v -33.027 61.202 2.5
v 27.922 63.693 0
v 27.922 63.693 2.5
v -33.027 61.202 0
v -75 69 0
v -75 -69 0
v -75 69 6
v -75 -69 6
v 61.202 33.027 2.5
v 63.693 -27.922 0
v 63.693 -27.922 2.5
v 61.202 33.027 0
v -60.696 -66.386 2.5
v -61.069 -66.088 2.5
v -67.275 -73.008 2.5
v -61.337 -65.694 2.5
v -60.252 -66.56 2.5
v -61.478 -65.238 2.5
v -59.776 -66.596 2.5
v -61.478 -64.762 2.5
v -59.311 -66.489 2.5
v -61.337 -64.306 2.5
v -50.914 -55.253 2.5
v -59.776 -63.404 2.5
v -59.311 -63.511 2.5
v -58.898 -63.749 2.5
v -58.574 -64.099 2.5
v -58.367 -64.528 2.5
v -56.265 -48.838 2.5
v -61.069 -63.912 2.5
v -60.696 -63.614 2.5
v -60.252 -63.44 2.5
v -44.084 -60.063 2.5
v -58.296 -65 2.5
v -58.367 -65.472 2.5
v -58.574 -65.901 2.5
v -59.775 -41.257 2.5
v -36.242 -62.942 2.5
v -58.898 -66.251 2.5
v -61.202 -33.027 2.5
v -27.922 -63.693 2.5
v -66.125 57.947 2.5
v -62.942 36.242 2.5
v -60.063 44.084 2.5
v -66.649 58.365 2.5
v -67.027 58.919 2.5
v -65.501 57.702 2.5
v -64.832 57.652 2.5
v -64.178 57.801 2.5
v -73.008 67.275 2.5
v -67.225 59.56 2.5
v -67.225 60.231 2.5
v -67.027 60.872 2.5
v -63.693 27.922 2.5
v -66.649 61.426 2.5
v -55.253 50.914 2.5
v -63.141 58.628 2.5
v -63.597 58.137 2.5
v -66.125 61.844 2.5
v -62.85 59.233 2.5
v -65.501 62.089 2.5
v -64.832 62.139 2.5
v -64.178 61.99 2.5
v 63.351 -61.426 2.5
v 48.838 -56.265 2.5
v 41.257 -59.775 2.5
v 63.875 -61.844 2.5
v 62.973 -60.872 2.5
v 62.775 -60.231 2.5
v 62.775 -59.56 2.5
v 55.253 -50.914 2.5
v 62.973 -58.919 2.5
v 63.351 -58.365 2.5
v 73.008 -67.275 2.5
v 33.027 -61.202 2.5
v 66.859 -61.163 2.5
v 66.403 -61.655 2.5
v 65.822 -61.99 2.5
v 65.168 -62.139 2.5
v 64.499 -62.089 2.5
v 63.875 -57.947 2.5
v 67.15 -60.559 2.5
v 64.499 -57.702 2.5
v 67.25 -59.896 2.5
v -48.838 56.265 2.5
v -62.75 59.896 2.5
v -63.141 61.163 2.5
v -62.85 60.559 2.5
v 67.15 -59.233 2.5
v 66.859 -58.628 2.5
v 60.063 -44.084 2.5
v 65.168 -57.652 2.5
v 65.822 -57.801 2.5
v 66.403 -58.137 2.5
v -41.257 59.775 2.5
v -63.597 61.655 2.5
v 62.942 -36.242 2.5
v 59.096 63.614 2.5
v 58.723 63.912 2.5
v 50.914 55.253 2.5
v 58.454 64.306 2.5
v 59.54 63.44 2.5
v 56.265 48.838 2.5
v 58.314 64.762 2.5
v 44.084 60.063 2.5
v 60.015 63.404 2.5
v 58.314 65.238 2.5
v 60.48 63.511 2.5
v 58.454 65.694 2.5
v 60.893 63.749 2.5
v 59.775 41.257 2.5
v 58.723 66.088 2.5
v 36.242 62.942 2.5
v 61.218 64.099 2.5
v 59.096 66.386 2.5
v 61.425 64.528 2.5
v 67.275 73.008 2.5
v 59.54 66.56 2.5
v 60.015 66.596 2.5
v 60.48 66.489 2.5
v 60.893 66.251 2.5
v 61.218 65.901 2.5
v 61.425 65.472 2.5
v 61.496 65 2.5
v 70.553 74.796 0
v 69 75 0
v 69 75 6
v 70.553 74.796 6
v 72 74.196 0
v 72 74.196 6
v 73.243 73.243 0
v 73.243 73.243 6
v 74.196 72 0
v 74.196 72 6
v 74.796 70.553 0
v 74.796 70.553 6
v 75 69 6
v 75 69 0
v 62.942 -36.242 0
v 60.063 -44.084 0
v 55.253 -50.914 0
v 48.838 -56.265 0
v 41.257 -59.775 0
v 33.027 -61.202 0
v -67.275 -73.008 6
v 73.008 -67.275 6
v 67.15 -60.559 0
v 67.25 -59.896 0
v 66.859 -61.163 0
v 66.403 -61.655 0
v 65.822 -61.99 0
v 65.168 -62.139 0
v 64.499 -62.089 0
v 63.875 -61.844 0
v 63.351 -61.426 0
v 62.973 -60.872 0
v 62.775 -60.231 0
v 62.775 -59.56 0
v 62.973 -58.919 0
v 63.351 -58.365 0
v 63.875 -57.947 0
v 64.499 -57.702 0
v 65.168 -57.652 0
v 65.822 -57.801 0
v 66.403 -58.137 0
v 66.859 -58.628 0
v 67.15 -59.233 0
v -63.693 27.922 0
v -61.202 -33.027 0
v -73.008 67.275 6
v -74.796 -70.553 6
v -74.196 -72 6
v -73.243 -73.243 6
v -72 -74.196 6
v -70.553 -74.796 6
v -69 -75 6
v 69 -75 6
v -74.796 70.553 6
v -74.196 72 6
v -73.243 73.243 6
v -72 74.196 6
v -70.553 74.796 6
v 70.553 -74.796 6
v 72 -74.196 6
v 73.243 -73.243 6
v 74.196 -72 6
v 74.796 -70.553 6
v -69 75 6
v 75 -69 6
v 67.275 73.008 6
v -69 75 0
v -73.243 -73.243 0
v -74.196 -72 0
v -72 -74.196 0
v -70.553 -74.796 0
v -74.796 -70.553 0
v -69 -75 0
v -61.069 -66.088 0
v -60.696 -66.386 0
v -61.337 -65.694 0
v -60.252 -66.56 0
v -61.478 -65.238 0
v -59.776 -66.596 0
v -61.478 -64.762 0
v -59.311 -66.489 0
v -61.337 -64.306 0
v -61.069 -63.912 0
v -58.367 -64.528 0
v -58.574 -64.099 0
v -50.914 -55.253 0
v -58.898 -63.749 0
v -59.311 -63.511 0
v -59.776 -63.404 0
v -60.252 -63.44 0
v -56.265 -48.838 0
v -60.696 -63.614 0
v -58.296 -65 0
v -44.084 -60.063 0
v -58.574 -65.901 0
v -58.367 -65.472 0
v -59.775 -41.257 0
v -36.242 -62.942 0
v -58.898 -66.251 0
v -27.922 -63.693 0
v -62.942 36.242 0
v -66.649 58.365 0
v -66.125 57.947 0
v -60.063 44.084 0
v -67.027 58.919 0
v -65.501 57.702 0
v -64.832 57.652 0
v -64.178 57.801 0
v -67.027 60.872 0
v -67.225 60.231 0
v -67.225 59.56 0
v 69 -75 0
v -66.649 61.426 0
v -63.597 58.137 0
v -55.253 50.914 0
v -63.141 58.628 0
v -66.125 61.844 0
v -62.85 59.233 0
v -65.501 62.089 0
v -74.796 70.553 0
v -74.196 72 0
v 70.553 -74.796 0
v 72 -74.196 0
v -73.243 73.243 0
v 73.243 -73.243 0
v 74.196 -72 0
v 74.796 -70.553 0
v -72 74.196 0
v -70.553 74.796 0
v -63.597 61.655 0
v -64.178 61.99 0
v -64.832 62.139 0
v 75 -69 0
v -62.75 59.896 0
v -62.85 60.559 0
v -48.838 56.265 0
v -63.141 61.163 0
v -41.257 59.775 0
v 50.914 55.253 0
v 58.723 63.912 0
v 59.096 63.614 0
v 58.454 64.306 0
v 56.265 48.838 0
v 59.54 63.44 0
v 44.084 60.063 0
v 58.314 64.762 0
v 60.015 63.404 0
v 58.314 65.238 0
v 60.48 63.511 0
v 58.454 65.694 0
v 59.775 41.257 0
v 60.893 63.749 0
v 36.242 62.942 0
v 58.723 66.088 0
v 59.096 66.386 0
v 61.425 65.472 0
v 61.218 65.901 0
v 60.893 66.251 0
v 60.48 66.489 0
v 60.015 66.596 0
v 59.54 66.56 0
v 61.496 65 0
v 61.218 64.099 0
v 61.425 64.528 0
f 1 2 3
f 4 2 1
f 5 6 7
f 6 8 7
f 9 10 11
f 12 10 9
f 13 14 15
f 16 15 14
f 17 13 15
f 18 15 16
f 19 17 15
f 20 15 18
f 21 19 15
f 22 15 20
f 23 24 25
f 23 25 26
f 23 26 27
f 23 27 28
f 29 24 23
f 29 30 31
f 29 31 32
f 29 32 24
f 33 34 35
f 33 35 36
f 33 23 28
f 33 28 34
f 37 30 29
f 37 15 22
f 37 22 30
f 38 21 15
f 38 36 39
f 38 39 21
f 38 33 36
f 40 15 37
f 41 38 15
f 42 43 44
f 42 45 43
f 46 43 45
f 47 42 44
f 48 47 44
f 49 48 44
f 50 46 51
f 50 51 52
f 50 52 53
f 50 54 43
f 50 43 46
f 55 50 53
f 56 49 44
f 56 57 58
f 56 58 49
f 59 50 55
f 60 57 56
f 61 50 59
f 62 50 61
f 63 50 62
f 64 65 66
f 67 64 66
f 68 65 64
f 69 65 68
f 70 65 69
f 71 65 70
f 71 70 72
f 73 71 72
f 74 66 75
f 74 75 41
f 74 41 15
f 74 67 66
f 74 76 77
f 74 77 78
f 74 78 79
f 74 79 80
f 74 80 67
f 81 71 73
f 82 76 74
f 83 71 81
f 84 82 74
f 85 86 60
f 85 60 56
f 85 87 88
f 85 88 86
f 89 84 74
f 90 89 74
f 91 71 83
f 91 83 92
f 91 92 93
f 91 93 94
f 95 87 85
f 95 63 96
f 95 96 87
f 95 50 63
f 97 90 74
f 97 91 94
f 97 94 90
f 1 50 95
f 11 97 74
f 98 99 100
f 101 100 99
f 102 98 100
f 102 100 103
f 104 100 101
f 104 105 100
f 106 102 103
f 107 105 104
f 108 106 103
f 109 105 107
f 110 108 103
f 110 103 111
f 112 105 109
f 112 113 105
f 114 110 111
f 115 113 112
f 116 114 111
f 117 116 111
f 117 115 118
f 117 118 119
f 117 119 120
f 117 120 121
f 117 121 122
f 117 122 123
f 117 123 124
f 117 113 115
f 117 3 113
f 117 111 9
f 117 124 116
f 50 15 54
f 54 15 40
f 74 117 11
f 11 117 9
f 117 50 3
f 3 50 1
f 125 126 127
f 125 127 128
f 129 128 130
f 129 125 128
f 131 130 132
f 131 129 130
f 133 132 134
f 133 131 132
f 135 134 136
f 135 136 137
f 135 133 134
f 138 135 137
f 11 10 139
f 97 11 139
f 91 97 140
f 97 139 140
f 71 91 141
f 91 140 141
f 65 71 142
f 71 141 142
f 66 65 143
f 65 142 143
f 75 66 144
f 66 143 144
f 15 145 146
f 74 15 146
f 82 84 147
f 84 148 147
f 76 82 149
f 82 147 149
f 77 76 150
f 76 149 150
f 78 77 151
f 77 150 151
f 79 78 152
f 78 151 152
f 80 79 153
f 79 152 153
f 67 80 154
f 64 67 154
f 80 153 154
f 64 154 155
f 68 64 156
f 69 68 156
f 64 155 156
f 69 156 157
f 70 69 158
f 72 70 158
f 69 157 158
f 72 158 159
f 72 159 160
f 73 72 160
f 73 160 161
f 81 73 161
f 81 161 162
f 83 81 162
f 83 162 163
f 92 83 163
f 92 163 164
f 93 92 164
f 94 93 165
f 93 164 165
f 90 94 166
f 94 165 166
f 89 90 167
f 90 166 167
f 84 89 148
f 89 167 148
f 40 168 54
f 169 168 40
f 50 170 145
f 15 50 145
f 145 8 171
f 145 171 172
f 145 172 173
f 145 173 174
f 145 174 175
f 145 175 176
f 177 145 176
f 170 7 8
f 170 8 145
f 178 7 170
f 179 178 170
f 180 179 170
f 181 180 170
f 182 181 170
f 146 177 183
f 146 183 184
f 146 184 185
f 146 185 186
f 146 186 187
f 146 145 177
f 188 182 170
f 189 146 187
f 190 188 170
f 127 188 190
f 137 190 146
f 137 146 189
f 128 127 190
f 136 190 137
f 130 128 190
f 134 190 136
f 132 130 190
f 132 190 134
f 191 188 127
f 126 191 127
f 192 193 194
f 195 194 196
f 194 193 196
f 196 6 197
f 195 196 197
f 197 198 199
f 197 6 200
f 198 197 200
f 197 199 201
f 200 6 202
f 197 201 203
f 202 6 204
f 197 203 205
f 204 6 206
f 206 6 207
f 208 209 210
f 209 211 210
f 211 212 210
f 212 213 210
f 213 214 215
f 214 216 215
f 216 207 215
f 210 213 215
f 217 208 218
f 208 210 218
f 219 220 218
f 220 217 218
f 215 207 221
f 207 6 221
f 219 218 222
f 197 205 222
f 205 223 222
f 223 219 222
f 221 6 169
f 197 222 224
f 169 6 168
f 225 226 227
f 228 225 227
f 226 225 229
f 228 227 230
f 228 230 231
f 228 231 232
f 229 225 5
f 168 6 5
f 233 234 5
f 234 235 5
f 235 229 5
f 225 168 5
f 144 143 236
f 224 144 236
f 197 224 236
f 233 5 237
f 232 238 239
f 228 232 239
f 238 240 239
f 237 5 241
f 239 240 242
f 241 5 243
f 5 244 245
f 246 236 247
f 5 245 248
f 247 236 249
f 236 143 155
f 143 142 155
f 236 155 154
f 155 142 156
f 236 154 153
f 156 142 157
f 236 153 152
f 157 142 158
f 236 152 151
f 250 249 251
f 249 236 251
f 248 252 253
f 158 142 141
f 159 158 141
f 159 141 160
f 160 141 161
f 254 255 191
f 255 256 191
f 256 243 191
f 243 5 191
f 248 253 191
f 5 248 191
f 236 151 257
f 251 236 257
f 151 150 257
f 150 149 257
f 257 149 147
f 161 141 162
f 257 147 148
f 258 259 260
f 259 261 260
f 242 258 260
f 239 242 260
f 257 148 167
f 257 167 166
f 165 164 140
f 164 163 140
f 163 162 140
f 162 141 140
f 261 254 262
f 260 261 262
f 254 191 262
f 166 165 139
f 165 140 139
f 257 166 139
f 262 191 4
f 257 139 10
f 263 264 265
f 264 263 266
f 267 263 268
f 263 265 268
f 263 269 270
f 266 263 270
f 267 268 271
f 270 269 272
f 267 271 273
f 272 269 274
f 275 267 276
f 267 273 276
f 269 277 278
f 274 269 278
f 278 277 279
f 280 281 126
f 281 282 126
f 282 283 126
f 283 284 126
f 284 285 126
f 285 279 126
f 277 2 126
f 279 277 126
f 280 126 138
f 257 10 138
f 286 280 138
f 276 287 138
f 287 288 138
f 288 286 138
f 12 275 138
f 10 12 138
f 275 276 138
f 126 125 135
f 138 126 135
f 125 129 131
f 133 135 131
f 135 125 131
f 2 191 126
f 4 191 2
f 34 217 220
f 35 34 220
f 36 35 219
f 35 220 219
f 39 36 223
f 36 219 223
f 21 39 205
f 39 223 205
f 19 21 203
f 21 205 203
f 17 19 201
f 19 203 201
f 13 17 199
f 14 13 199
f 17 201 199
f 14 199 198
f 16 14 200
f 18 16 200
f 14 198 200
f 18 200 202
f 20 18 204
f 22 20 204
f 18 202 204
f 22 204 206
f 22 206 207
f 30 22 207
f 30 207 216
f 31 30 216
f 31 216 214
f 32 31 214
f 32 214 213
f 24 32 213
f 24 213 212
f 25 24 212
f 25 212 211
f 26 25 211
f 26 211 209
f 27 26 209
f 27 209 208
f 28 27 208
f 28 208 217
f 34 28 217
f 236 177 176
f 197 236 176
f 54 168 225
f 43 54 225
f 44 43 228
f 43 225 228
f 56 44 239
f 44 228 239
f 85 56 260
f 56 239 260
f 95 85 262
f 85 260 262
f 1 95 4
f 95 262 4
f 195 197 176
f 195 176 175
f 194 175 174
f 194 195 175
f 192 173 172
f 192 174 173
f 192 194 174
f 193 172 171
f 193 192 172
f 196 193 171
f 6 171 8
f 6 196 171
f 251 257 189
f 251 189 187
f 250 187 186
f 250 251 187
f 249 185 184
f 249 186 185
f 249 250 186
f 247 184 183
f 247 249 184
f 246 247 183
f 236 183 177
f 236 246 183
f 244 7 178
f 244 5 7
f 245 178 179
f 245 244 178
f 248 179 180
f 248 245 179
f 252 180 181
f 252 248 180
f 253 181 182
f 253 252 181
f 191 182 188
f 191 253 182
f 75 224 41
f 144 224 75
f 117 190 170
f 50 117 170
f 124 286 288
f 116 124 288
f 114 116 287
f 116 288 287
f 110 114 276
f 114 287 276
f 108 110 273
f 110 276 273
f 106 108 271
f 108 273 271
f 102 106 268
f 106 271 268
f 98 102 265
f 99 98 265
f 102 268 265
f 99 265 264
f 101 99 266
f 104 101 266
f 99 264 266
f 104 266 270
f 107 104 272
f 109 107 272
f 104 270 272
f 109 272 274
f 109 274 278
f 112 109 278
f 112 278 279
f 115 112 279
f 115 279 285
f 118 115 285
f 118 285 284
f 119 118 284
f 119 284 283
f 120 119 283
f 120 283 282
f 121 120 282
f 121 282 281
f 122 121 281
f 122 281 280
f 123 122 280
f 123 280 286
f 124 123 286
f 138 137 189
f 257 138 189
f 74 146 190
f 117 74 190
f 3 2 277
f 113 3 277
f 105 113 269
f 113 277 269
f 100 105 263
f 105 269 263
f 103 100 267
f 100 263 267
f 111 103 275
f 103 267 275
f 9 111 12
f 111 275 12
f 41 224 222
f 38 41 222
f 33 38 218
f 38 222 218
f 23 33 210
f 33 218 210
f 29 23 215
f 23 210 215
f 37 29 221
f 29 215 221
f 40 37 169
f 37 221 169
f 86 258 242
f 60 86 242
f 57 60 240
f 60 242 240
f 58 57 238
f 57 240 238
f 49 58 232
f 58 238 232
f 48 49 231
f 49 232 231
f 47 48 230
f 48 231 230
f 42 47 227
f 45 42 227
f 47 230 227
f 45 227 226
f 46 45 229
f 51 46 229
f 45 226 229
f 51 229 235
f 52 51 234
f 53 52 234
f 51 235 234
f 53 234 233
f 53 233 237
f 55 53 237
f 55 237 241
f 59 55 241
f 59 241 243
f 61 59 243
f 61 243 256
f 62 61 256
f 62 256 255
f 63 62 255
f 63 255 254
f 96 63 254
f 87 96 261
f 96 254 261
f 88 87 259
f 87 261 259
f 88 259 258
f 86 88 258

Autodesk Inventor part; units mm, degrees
ref_plane "YZ Plane" through (0, 0, 0) normal (1, 0, 0) x (0, 1, 0)
ref_plane "XZ Plane" through (0, 0, 0) normal (0, 1, 0) x (-1, 0, 0)
ref_plane "XY Plane" through (0, 0, 0) normal (0, 0, 1) x (1, 0, 0)
sketch "スケッチ1" plane through (0, 0, 0) normal (0, 0, 1) x (1, 0, 0)
  line L0 (-75, -215) -> (75, -215)
  line L1 (75, -215) -> (75, 215)
  line L2 (75, 215) -> (-75, 215)
  line L3 (-75, 215) -> (-75, -215)
  line L4 (-75, -215) -> (75, 215) construction
  line L5 (75, -215) -> (-75, 215) construction
  line L6 (-65, -215) -> (-65, 215) construction
  line L7 (-65, 59.8957) -> (59.8957, 65) construction
  line L8 (59.8957, 65) -> (65, -59.8957) construction
  line L9 (65, -59.8957) -> (-59.8957, -65) construction
  line L10 (-59.8957, -65) -> (-65, 59.8957) construction
  line L11 (-65, 59.8957) -> (65, -59.8957) construction
  line L12 (59.8957, 65) -> (-59.8957, -65) construction
  circle A0 centre (-65, 59.8957) radius 2.25
  line L13 (-67.0832, -72.8) -> (72.8, -67.0832) construction
  line L14 (72.8, -67.0832) -> (67.0832, 72.8) construction
  line L15 (67.0832, 72.8) -> (-72.8, 67.0832) construction
  line L16 (-72.8, 67.0832) -> (-67.0832, -72.8) construction
  line L17 (-67.0832, -72.8) -> (67.0832, 72.8) construction
  line L18 (72.8, -67.0832) -> (-72.8, 67.0832) construction
  line L19 (0, 0) -> (0, 70.0584) construction
  circle A1 centre (65, -59.8957) radius 2.25
  circle A2 centre (59.8957, 65) radius 1.6
  circle A3 centre (-59.8957, -65) radius 1.6
  line L20 (-63.6933, 27.9224) -> (-61.2024, -33.0267)
  line L21 (-27.9224, -63.6933) -> (33.0267, -61.2024)
  line L22 (63.6933, -27.9224) -> (61.2024, 33.0267)
  line L23 (27.9224, 63.6933) -> (-33.0267, 61.2024)
  line L24 (-62.4479, -2.5521) -> (62.4479, 2.5521) construction
  arc A4 (-33.0267, 61.2024) -> (-63.6933, 27.9224) centre (-31.72, 29.2291) ccw
  arc A5 (61.2024, 33.0267) -> (27.9224, 63.6933) centre (29.2291, 31.72) ccw
  arc A6 (33.0267, -61.2024) -> (63.6933, -27.9224) centre (31.72, -29.2291) ccw
  arc A7 (-61.2024, -33.0267) -> (-27.9224, -63.6933) centre (-29.2291, -31.72) ccw
  circle A8 centre (-65, -81.1043) radius 2.25
  circle A9 centre (-59.8957, -206) radius 1.6
  circle A10 centre (65, -200.8957) radius 2.25
  circle A11 centre (59.8957, -76) radius 1.6
  arc A12 (61.2024, -107.9733) -> (27.9224, -77.3067) centre (29.2291, -109.28) ccw
  line L25 (27.9224, -77.3067) -> (-33.0267, -79.7976)
  arc A13 (-33.0267, -79.7976) -> (-63.6933, -113.0776) centre (-31.72, -111.7709) ccw
  line L26 (-63.6933, -113.0776) -> (-61.2024, -174.0267)
  arc A14 (-61.2024, -174.0267) -> (-27.9224, -204.6933) centre (-29.2291, -172.72) ccw
  line L27 (-27.9224, -204.6933) -> (33.0267, -202.2024)
  arc A15 (33.0267, -202.2024) -> (63.6933, -168.9224) centre (31.72, -170.2291) ccw
  line L28 (63.6933, -168.9224) -> (61.2024, -107.9733)
  circle A16 centre (-65, 200.8957) radius 2.25
  circle A17 centre (-59.8957, 76) radius 1.6
  circle A18 centre (65, 81.1043) radius 2.25
  circle A19 centre (59.8957, 206) radius 1.6
  arc A20 (61.2024, 174.0267) -> (27.9224, 204.6933) centre (29.2291, 172.72) ccw
  line L29 (27.9224, 204.6933) -> (-33.0267, 202.2024)
  arc A21 (-33.0267, 202.2024) -> (-63.6933, 168.9224) centre (-31.72, 170.2291) ccw
  line L30 (-63.6933, 168.9224) -> (-61.2024, 107.9733)
  arc A22 (-61.2024, 107.9733) -> (-27.9224, 77.3067) centre (-29.2291, 109.28) ccw
  line L31 (-27.9224, 77.3067) -> (33.0267, 79.7976)
  arc A23 (33.0267, 79.7976) -> (63.6933, 113.0776) centre (31.72, 111.7709) ccw
  line L32 (63.6933, 113.0776) -> (61.2024, 174.0267)
  circle A24 centre (-65, 59.8957) radius 2.25
  circle A25 centre (-59.8957, -65) radius 1.6
  circle A26 centre (65, -59.8957) radius 2.25
  circle A27 centre (59.8957, 65) radius 1.6
  arc A28 (61.2024, 33.0267) -> (27.9224, 63.6933) centre (29.2291, 31.72) ccw
  line L33 (27.9224, 63.6933) -> (-33.0267, 61.2024)
  arc A29 (-33.0267, 61.2024) -> (-63.6933, 27.9224) centre (-31.72, 29.2291) ccw
  line L34 (-63.6933, 27.9224) -> (-61.2024, -33.0267)
  arc A30 (-61.2024, -33.0267) -> (-27.9224, -63.6933) centre (-29.2291, -31.72) ccw
  line L35 (-27.9224, -63.6933) -> (33.0267, -61.2024)
  arc A31 (33.0267, -61.2024) -> (63.6933, -27.9224) centre (31.72, -29.2291) ccw
  line L36 (63.6933, -27.9224) -> (61.2024, 33.0267)
  point P0 (-65, 59.8957)
  point P1 (59.8957, 65)
  point P2 (-65, -81.1043)
  point P3 (59.8957, -76)
  point P4 (-62.4479, -143.5521)
  point P5 (62.4479, -138.4479)
  point P6 (-65, 200.8957)
  point P7 (59.8957, 206)
  point P8 (-62.4479, 138.4479)
  point P9 (62.4479, 143.5521)
  point P10 (-65, 59.8957)
  point P11 (59.8957, 65)
  dimension "d0" = 150
  dimension "d1" = 430
  dimension "d3" = 65
  dimension "d4" = 125
  dimension "d7" = 4.5
  dimension "d8" = 140
  dimension "d9" = 70.0584
  dimension "d10" = 3.2
  dimension "d24" = 125
  dimension "d25" = 32
  dimension "d28" = 141
  dimension "d31" = 141
extrude "押し出し1" add sketch "スケッチ1" along normal blind 6 contours L3 L2 L1 L0 | A8 | A11 | A17 | A18
sketch "スケッチ4" plane through (0, 0, 6) normal (0, 0, 1) x (1, 0, 0)
  line L0 (-75, 75) -> (75, 75)
  line L1 (75, 75) -> (75, -75)
  line L2 (75, -75) -> (-75, -75)
  line L3 (-75, -75) -> (-75, 75)
  point P0 (0, 0)
  point P1 (-75, 0)
  point P2 (0, 75)
  dimension "d43" = 150
  dimension "d46" = 150
extrude "押し出し3" cut sketch "スケッチ4" against normal through all keep common part
sketch "スケッチ5" plane through (0, 0, 6) normal (0, 0, 1) x (1, 0, 0)
  line L0 (-73.008, 67.2749) -> (-67.2749, -73.008)
  line L1 (-67.2749, -73.008) -> (73.008, -67.2749)
  line L2 (73.008, -67.2749) -> (67.2749, 73.008)
  line L3 (67.2749, 73.008) -> (-73.008, 67.2749)
  line L4 (-33.0267, 61.2024) -> (27.9224, 63.6933) construction
  line L5 (67.2749, 73.008) -> (-67.2749, -73.008) construction
  point P0 (0, 0)
  point P1 (0, 0)
  dimension "d47" = 140.4
extrude "押し出し4" cut sketch "スケッチ5" against normal blind 3.5
fillet "フィレット2" radius 6 4 edges at (-75, 75, 3) (-75, -75, 3) (75, -75, 3) (75, 75, 3)
properties part number "bottom_140mm" material "アルミニウム 6061"
